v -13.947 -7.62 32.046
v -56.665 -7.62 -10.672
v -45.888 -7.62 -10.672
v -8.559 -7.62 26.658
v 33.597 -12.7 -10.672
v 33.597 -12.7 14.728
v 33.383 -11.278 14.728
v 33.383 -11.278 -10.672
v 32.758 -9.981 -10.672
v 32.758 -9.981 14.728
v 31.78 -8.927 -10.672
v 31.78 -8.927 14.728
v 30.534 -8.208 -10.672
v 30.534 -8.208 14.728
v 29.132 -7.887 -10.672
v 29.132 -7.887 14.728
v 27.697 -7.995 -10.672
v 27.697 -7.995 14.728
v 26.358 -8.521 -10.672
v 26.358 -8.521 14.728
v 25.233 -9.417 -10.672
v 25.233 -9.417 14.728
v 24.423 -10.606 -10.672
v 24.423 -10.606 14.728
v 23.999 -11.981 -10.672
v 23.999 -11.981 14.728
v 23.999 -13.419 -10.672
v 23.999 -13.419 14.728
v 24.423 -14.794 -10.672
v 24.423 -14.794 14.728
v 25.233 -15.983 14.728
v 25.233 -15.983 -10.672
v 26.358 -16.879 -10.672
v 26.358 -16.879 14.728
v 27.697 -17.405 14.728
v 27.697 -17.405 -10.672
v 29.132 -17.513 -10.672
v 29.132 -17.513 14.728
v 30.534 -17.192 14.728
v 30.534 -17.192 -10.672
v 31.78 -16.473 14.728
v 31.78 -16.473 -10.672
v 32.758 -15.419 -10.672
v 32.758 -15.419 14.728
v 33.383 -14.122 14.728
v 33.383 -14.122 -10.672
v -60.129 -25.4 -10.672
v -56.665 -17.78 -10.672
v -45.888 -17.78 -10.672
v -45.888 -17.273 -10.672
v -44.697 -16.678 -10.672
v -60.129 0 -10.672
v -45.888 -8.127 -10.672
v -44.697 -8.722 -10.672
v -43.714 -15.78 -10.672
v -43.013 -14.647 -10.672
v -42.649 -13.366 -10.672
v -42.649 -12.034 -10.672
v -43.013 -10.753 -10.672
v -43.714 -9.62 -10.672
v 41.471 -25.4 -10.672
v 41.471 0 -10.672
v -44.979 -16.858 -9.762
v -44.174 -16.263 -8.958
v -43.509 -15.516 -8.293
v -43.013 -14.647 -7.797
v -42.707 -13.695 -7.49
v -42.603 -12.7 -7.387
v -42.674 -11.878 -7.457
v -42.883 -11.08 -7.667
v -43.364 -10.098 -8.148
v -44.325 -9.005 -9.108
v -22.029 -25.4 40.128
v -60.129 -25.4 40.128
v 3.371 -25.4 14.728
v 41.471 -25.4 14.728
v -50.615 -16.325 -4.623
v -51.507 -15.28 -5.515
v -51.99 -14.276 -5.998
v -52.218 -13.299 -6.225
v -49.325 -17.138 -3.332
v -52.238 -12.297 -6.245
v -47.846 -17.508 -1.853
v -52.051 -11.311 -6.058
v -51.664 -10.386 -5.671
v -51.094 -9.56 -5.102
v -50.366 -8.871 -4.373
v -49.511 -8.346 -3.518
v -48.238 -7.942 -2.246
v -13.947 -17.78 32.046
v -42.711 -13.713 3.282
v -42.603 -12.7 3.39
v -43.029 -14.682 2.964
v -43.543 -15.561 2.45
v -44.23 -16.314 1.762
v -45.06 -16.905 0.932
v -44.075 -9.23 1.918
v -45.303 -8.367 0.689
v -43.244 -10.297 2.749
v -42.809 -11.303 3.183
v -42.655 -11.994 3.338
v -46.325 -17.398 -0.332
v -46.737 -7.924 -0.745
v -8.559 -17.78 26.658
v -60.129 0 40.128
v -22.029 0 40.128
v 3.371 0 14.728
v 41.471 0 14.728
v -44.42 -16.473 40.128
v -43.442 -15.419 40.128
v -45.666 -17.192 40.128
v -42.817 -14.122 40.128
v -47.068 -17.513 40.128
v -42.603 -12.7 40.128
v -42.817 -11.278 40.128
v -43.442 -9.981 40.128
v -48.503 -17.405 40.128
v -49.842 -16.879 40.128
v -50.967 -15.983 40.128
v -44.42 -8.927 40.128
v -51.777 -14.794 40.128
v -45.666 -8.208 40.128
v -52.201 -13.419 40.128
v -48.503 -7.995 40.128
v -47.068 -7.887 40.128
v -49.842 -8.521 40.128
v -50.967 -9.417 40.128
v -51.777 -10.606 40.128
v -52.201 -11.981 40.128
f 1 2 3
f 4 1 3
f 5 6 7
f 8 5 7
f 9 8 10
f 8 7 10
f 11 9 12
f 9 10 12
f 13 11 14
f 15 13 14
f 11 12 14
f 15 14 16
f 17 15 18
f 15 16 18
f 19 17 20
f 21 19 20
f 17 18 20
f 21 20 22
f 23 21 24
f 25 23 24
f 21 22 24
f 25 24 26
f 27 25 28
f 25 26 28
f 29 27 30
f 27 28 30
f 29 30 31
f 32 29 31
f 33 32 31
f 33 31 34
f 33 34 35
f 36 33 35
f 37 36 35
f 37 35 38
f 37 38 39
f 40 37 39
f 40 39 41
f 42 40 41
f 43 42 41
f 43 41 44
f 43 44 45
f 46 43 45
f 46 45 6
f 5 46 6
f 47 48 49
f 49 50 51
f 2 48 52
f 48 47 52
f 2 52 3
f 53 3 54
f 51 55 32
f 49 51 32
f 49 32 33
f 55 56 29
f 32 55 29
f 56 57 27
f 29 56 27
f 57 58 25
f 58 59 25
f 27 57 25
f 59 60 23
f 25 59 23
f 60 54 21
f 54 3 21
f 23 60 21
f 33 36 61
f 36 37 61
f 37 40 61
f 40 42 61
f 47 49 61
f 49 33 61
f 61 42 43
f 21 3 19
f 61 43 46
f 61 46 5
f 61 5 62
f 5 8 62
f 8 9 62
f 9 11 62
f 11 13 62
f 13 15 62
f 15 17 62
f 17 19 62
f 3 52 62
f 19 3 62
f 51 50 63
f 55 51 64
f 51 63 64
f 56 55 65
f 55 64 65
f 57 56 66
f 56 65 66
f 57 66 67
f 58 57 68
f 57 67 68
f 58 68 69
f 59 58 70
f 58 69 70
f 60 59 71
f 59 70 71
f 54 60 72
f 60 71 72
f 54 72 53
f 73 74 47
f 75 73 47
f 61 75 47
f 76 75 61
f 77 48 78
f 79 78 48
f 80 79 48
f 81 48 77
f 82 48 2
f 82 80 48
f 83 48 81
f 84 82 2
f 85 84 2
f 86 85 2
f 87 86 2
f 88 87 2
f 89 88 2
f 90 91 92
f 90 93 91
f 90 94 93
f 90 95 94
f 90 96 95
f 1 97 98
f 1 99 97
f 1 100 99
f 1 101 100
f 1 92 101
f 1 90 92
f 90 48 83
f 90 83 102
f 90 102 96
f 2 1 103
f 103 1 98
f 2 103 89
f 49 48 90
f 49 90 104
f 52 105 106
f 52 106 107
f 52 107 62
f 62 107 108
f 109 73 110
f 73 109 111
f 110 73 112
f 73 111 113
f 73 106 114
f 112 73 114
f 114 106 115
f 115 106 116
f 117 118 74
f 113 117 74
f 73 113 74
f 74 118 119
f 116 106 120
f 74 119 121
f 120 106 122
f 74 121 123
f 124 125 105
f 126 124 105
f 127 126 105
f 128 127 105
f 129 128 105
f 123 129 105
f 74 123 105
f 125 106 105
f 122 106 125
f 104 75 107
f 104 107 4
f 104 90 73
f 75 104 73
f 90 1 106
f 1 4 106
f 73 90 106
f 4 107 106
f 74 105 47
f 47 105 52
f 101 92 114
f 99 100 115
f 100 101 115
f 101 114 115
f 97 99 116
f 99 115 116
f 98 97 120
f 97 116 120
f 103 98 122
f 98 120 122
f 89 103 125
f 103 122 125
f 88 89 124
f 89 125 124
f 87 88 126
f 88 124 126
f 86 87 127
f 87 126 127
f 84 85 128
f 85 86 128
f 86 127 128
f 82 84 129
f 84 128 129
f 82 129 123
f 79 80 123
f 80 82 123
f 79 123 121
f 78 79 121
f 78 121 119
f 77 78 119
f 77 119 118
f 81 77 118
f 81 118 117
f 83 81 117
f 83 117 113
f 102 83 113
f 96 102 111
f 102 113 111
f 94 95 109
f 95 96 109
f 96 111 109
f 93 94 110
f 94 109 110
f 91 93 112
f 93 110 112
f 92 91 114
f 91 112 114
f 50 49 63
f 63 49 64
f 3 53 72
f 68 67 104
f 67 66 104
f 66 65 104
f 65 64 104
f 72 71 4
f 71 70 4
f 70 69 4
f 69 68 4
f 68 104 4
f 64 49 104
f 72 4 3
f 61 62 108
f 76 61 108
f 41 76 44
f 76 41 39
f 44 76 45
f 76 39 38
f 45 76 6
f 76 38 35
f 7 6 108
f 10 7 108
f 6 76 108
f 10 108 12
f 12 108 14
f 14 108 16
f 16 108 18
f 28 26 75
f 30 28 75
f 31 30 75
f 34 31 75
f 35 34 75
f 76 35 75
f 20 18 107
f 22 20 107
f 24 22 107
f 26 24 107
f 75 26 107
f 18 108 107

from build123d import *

# Parameters (mm, degrees)
F1_DEPTH = 25.4
F2_R     = 4.826
F3_DEPTH = 50.801
F4_W     = 7.62
F4_H     = 10.16
F5_DEPTH = 62.862793


with BuildPart() as f1:
    # F0 (on Front) → F1 (new body)
    with BuildSketch(Plane.XZ):
        Polygon((-22.029007, 40.128093), (-60.129007, 40.128093), (-60.129007, -10.671907), (41.470993, -10.671907), (41.470993, 14.728093), (3.370993, 14.728093), align=None)
    extrude(amount=F1_DEPTH)

    # F2 (on face) → F3 (cut, through all)
    with BuildSketch(Plane.XY.offset(40.128093)):
        with Locations((-47.429007, -12.7)):
            Circle(F2_R)
        with Locations((28.770993, -12.7)):
            Circle(F2_R)
    extrude(amount=-F3_DEPTH, mode=Mode.SUBTRACT)

    # F4 (on face) → F5 (cut, through all)
    with BuildSketch(Plane(origin=(9.049543, 0, 9.049543), x_dir=(0.707107, 0, -0.707107), z_dir=(0.707107, 0, 0.707107))):
        with Locations((-28.711707, -12.7)):
            Rectangle(F4_W, F4_H)
    extrude(amount=-F5_DEPTH, mode=Mode.SUBTRACT)


solid = f1.part
